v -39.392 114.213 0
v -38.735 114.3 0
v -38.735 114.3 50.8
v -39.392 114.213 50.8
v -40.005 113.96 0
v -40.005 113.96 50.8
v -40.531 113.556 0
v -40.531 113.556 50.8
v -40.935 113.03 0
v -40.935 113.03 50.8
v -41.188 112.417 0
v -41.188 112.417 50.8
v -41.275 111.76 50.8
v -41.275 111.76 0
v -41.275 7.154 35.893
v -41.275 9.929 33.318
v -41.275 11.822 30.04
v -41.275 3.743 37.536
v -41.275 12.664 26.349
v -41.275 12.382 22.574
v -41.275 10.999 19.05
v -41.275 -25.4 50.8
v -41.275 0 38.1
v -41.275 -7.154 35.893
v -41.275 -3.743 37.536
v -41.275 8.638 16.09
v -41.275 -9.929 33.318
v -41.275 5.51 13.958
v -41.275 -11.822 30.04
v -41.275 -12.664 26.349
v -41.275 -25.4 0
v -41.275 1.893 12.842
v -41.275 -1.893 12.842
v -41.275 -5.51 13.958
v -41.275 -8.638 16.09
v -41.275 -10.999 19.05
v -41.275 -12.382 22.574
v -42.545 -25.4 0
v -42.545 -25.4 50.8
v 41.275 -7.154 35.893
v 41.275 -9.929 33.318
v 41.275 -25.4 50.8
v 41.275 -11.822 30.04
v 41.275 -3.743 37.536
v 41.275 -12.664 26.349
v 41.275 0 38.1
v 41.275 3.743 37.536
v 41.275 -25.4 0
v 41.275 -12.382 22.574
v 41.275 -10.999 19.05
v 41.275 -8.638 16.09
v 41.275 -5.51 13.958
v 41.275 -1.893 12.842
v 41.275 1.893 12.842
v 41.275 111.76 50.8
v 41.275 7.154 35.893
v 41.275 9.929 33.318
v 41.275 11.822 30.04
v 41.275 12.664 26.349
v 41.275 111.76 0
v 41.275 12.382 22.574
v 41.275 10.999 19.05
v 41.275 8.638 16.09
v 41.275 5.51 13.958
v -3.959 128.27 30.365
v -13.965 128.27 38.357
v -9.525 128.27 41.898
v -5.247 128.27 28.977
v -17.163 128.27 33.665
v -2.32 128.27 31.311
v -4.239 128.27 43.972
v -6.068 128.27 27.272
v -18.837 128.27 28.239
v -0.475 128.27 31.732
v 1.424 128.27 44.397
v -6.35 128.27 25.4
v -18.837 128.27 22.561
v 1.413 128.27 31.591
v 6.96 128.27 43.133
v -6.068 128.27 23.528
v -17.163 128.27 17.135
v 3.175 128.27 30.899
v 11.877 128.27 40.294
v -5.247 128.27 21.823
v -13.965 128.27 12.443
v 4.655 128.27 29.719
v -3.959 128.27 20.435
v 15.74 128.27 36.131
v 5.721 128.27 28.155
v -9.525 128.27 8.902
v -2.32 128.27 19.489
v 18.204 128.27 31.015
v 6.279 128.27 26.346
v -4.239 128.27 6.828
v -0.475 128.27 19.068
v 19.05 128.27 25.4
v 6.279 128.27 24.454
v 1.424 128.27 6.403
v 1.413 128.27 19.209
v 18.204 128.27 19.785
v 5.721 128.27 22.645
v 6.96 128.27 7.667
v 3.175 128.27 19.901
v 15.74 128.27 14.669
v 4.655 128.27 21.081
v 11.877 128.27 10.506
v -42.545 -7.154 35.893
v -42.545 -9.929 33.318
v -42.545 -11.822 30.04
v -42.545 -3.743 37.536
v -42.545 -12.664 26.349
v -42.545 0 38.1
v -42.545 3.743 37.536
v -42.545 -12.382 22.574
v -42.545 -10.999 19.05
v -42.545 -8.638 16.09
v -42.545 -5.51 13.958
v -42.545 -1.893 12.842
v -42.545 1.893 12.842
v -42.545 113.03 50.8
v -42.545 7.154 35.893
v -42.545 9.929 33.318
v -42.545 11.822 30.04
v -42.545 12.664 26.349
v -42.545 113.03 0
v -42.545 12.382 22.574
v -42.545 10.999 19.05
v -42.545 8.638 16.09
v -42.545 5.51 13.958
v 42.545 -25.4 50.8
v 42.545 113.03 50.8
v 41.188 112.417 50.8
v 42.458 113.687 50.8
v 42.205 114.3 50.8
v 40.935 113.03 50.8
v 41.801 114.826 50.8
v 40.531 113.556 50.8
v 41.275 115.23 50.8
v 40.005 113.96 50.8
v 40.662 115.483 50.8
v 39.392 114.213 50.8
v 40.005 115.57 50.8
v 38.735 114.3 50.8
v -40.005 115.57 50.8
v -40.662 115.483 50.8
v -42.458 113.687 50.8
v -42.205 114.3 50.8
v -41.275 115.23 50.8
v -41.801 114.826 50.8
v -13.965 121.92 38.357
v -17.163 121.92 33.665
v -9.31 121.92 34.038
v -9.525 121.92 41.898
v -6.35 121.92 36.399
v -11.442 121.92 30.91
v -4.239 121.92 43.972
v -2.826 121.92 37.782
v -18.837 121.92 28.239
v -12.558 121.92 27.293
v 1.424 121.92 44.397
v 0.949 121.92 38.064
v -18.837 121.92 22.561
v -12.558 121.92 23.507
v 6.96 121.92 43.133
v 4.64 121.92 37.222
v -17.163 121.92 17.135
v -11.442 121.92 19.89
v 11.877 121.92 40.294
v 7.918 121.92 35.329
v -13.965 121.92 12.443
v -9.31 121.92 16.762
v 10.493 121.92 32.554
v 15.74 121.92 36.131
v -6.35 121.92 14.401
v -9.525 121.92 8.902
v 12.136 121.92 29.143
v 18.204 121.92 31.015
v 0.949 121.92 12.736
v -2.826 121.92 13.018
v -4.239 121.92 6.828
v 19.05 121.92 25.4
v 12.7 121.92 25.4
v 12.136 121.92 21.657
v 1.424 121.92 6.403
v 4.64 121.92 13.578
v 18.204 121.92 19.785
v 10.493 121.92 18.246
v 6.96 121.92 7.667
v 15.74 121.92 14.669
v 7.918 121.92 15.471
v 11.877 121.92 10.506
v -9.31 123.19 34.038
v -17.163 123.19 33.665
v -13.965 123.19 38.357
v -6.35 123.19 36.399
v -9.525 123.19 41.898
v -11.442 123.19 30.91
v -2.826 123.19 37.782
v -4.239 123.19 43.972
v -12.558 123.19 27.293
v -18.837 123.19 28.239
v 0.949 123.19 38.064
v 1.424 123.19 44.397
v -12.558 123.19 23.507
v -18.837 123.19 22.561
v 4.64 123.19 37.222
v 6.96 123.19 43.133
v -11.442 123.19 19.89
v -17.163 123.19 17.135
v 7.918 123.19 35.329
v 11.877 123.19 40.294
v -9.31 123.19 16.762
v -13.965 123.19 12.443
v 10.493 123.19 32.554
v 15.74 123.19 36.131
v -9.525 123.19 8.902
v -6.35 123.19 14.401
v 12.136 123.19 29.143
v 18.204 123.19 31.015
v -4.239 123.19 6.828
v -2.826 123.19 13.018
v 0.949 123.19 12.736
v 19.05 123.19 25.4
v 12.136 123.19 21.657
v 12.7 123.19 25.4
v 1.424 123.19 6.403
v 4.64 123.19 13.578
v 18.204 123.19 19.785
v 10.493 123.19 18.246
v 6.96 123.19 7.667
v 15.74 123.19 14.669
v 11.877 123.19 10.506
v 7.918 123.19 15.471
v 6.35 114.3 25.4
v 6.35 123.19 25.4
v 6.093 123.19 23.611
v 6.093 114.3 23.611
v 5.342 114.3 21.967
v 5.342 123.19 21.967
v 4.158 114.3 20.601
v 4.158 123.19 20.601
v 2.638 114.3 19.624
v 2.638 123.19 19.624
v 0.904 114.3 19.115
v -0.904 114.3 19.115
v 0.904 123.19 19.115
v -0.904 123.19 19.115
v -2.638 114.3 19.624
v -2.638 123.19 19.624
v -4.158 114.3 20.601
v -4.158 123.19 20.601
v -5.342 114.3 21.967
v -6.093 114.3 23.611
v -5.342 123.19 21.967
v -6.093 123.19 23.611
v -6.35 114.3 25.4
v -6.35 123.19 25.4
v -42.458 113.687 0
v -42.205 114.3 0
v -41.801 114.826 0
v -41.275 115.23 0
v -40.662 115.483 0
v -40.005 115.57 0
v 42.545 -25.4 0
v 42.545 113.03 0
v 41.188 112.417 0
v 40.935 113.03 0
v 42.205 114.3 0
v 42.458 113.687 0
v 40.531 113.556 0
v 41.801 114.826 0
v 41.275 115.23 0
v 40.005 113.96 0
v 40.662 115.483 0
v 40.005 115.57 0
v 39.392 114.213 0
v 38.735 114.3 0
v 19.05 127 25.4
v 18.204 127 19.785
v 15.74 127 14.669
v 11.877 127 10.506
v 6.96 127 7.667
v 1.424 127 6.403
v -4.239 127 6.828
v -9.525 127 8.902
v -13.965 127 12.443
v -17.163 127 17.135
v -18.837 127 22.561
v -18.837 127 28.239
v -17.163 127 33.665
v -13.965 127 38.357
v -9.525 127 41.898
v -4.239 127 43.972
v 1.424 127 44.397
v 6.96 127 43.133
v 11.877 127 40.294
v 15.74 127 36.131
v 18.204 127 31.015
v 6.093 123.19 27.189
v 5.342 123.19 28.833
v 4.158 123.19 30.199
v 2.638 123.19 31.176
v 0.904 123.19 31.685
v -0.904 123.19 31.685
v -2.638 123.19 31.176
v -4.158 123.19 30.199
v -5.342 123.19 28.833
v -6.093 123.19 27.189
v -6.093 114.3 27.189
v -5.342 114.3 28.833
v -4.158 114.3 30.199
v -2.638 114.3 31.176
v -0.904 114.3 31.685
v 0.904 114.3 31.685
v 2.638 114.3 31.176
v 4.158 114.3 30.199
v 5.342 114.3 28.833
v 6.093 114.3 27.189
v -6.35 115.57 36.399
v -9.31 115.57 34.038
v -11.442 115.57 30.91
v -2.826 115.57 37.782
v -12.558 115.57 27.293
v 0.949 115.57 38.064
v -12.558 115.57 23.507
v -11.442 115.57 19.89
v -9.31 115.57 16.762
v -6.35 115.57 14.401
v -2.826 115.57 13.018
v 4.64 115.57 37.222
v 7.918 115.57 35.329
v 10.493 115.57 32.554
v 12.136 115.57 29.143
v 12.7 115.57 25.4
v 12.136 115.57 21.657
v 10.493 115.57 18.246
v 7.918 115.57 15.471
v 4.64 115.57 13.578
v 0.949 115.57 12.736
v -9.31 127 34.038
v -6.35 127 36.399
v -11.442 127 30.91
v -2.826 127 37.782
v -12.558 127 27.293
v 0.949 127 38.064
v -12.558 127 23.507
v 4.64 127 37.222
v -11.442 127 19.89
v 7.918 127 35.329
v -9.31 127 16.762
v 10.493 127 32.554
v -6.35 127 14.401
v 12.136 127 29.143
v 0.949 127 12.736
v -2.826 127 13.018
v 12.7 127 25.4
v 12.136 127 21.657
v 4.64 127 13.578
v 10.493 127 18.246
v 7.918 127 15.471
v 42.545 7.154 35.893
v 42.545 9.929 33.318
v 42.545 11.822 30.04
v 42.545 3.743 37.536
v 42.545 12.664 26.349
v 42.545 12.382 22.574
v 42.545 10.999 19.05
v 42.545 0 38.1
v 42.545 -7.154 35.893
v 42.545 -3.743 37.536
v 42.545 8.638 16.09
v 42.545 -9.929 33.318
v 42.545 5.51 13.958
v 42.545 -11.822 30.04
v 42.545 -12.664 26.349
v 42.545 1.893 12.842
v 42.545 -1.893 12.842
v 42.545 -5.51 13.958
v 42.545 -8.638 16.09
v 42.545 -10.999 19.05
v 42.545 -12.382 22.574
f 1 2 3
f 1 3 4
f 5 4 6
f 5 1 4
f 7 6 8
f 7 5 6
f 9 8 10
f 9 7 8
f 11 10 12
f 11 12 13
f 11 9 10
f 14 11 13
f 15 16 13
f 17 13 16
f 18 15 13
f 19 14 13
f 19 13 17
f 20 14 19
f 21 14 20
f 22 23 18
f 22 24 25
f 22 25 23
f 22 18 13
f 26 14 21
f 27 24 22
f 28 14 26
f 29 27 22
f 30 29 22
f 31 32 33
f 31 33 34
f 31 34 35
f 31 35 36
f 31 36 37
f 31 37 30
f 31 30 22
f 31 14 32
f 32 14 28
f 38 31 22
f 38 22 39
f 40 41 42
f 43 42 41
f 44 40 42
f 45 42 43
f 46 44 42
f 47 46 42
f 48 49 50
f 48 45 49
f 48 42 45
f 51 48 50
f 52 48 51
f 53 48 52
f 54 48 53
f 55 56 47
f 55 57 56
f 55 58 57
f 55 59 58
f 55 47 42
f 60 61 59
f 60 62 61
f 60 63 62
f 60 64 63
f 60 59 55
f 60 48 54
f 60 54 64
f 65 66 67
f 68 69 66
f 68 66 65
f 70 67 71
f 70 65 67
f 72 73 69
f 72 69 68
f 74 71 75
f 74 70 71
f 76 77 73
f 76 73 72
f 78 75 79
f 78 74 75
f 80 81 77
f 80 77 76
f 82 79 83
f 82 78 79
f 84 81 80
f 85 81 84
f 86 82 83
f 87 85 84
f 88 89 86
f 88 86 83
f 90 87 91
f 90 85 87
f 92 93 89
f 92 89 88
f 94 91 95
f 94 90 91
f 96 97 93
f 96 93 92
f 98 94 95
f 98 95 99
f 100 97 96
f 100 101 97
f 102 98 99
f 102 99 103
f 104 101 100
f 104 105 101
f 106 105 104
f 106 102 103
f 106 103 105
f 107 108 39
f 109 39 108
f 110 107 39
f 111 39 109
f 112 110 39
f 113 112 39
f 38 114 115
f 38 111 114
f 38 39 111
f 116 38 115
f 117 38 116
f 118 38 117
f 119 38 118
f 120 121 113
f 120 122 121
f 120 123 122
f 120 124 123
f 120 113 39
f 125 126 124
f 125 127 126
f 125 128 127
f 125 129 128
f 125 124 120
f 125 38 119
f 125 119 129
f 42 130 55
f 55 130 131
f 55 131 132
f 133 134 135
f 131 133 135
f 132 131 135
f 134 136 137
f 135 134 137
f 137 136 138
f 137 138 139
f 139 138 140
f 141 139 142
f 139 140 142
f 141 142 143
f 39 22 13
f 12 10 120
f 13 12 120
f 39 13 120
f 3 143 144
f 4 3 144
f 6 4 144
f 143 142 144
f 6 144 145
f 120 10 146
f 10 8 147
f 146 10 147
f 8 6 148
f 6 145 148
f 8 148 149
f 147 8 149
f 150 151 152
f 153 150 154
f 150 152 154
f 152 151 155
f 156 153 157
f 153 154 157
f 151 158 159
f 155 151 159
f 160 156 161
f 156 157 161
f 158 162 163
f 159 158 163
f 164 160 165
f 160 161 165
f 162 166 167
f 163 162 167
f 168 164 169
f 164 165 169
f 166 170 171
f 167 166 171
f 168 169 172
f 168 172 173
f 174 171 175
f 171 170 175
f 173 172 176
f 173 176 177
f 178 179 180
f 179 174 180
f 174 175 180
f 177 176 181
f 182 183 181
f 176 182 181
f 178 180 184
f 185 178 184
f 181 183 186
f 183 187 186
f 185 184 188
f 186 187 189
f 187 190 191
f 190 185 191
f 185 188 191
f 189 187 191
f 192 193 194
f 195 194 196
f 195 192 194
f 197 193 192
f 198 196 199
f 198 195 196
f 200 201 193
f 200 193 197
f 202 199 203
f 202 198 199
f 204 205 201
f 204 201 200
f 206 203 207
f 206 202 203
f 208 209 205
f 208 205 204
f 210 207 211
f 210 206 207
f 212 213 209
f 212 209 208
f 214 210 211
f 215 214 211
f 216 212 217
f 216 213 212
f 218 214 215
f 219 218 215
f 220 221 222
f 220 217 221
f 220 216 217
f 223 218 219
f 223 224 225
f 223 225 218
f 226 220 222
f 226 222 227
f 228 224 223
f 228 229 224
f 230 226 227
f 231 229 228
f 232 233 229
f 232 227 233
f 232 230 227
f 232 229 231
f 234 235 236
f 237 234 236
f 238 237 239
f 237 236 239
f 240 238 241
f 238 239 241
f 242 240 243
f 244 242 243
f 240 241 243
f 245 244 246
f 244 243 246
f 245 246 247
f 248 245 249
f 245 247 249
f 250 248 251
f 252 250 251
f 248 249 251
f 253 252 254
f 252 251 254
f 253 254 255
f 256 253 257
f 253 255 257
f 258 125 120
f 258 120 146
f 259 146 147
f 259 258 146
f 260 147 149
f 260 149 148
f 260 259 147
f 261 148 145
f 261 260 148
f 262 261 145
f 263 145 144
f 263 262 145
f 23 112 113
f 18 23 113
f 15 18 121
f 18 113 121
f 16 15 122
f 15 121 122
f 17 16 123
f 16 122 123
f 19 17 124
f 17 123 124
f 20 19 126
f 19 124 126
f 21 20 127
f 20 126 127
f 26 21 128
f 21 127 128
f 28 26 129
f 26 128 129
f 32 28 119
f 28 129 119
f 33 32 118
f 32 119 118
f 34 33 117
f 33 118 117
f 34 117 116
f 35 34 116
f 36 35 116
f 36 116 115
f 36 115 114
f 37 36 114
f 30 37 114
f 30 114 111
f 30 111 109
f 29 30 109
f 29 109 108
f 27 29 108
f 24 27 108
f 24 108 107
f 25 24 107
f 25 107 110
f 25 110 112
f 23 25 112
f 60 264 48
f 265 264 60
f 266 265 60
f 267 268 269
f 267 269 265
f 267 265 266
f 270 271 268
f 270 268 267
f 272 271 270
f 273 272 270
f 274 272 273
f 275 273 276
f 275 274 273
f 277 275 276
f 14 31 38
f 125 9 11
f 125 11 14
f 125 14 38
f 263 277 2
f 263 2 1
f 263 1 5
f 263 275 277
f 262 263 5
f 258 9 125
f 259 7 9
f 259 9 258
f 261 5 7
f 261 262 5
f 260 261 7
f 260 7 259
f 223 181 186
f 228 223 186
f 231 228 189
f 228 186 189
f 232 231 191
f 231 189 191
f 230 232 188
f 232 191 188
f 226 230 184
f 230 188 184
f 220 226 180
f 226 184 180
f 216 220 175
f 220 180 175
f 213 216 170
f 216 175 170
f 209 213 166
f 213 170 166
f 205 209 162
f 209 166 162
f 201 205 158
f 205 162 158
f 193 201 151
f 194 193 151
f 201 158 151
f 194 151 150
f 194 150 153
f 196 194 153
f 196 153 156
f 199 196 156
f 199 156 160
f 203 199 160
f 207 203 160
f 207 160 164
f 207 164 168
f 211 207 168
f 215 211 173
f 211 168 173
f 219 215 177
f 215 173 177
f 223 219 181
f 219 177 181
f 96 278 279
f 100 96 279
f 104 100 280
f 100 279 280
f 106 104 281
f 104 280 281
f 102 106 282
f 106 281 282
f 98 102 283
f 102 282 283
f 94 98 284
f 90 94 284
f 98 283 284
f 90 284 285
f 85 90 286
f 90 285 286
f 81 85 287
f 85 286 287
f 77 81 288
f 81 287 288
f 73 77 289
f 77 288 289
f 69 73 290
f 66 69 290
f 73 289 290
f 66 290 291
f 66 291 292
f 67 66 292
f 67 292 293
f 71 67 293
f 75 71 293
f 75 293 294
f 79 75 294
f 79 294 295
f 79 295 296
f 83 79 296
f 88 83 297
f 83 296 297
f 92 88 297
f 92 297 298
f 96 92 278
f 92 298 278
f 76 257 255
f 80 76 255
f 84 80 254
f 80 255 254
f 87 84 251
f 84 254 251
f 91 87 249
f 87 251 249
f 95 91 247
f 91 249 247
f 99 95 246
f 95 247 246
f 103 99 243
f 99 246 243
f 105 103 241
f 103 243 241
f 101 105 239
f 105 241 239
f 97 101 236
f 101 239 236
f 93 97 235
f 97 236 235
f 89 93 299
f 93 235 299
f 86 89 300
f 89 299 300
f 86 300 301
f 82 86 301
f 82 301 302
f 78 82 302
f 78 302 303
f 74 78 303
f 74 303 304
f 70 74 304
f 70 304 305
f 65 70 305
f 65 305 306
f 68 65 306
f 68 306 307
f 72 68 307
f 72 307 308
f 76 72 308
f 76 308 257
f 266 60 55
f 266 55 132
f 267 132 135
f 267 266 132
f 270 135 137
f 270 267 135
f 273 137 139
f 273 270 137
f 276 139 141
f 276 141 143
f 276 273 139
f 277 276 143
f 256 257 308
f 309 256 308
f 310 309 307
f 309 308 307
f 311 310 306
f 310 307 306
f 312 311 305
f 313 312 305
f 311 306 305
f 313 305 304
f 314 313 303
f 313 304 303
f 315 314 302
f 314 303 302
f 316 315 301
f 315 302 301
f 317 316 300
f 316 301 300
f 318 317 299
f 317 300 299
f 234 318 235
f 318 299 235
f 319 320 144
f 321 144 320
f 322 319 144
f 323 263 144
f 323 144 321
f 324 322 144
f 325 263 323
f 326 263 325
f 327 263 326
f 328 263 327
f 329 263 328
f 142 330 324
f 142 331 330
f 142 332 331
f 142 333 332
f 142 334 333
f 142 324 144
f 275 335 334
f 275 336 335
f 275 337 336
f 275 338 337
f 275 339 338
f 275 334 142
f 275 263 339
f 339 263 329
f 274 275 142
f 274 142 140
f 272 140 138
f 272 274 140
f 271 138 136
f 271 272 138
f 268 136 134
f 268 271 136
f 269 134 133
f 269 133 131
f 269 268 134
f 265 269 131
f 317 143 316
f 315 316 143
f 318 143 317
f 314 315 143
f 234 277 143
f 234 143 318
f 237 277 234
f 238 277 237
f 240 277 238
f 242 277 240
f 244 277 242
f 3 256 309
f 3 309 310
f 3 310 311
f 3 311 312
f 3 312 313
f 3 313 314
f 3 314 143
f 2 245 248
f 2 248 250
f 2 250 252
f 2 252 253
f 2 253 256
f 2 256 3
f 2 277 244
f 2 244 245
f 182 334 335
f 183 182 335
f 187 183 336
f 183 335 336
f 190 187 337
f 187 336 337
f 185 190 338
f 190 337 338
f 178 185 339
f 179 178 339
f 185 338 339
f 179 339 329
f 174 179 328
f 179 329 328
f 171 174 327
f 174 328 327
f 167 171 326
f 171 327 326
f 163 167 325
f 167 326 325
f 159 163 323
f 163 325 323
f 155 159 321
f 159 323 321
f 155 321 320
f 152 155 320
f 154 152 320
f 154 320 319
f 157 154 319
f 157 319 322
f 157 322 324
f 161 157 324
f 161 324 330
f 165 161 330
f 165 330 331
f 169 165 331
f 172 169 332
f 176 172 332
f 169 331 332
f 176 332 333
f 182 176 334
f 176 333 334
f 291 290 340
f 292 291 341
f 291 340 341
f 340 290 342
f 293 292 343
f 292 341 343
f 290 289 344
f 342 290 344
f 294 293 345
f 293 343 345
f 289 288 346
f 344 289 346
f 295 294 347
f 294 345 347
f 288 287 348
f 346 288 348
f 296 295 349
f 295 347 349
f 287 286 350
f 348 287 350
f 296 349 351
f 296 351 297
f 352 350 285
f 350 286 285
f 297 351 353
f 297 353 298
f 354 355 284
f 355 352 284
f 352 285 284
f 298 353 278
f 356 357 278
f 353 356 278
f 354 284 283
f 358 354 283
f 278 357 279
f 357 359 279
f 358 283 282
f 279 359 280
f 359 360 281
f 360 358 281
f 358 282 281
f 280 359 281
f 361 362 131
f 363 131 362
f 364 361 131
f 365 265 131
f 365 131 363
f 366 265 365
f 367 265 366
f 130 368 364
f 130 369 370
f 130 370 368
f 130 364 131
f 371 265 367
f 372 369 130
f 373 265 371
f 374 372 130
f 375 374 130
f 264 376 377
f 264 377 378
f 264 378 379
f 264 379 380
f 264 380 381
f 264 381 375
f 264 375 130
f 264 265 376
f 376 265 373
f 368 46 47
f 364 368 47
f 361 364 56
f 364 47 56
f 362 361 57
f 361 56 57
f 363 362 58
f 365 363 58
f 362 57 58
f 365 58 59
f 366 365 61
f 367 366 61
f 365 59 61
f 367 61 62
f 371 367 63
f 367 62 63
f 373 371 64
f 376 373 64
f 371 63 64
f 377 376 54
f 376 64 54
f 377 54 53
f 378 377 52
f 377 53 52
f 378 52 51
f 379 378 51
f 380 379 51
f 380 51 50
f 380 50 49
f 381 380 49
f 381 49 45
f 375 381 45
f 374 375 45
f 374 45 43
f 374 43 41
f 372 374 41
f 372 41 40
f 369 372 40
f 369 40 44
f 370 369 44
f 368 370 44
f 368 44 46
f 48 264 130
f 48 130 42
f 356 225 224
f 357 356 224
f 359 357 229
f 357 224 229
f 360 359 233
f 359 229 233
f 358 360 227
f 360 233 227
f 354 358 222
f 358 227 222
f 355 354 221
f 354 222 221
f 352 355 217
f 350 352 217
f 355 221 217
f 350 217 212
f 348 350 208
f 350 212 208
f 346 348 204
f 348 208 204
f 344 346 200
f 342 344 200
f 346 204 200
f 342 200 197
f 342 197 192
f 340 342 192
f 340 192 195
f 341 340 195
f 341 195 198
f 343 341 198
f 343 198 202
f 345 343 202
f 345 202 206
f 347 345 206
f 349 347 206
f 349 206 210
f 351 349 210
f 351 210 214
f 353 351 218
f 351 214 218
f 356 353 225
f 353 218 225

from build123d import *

# Parameters (mm, degrees)
BOSS_EXTRUDE1_DEPTH         = 50.8
SKETCH2_R                   = 12.7
CUT_EXTRUDE1_DEPTH          = 86.09
SKETCH3_R                   = 12.7
BOSS_EXTRUDE2_DEPTH         = 6.35
SKETCH4_R                   = 19.05
BOSS_EXTRUDE3_DEPTH         = 1.27
CUT_EXTRUDE2_REACH          = 150.59
SKETCH5_R                   = 6.35
SKETCH6_R                   = 12.7
BOSS_EXTRUDE4_DEPTH         = 3.81
SKETCH7_R                   = 19.05
BOSS_EXTRUDE5_DEPTH         = 1.27
F_1_16_0_5_DIAMETER_HOLE1_D = 12.7


with BuildPart() as part:
    # Sketch1 → Boss-Extrude1 (new body)
    with BuildSketch(Plane.XY):
        with BuildLine():
            Line((42.545, 113.03), (42.545, -25.4))
            Line((42.545, -25.4), (41.275, -25.4))
            Line((41.275, -25.4), (41.275, 111.76))
            ThreePointArc((41.275, 111.76), (40.531051224, 113.556051224), (38.735, 114.3))
            Line((38.735, 114.3), (-38.735, 114.3))
            ThreePointArc((-38.735, 114.3), (-40.531051224, 113.556051224), (-41.275, 111.76))
            Line((-41.275, 111.76), (-41.275, -25.4))
            Line((-41.275, -25.4), (-42.545, -25.4))
            Line((-42.545, -25.4), (-42.545, 113.03))
            ThreePointArc((-42.545, 113.03), (-41.801051224, 114.826051224), (-40.005, 115.57))
            Line((-40.005, 115.57), (40.005, 115.57))
            ThreePointArc((40.005, 115.57), (41.801051224, 114.826051224), (42.545, 113.03))
        make_face()
    extrude(amount=BOSS_EXTRUDE1_DEPTH)

    # Sketch2 → Cut-Extrude1 (cut, through all)
    with BuildSketch(Plane.ZY.offset(42.545)):
        with Locations((25.4, 0)):
            Circle(SKETCH2_R)
    extrude(amount=-CUT_EXTRUDE1_DEPTH, mode=Mode.SUBTRACT)

    # Sketch3 → Boss-Extrude2 (add)
    with BuildSketch(Plane(origin=(0, 115.57, 0), x_dir=(1, 0, 0), z_dir=(0, 1, 0))):
        with Locations((0, -25.4)):
            Circle(SKETCH3_R)
    extrude(amount=BOSS_EXTRUDE2_DEPTH)

    # Sketch4 → Boss-Extrude3 (add)
    with BuildSketch(Plane(origin=(0, 121.92, 0), x_dir=(1, 0, 0), z_dir=(0, 1, 0))):
        with Locations((0, -25.4)):
            Circle(SKETCH4_R)
    extrude(amount=BOSS_EXTRUDE3_DEPTH)

    # Sketch5 → Cut-Extrude2 (cut, up to next)
    with BuildSketch(Plane(origin=(0, 123.19, 0), x_dir=(1, 0, 0), z_dir=(0, 1, 0)), mode=Mode.PRIVATE) as cut_extrude2_sk1:
        with Locations((0, -25.4)):
            Circle(SKETCH5_R)
    cut_extrude2_tool1 = extrude(cut_extrude2_sk1.sketch, amount=-CUT_EXTRUDE2_REACH, mode=Mode.PRIVATE) & part.part
    add(cut_extrude2_tool1.solids().sort_by_distance((0, 123.19, 25.4))[0], mode=Mode.SUBTRACT)

    # Sketch6 → Boss-Extrude4 (add)
    with BuildSketch(Plane(origin=(0, 123.19, 0), x_dir=(1, 0, 0), z_dir=(0, 1, 0))):
        with Locations((0, -25.4)):
            Circle(SKETCH6_R)
    extrude(amount=BOSS_EXTRUDE4_DEPTH)

    # Sketch7 → Boss-Extrude5 (add)
    with BuildSketch(Plane(origin=(0, 127, 0), x_dir=(1, 0, 0), z_dir=(0, 1, 0))):
        with Locations((0, -25.4)):
            Circle(SKETCH7_R)
    extrude(amount=BOSS_EXTRUDE5_DEPTH)

    # 1/16 (0.5) Diameter Hole1 (through all)
    with Locations(Plane(origin=(0, 128.27, 0), x_dir=(1, 0, 0), z_dir=(0, 1, 0))):
        with Locations((0, -25.4)):
            Hole(F_1_16_0_5_DIAMETER_HOLE1_D / 2)


solid = part.part
